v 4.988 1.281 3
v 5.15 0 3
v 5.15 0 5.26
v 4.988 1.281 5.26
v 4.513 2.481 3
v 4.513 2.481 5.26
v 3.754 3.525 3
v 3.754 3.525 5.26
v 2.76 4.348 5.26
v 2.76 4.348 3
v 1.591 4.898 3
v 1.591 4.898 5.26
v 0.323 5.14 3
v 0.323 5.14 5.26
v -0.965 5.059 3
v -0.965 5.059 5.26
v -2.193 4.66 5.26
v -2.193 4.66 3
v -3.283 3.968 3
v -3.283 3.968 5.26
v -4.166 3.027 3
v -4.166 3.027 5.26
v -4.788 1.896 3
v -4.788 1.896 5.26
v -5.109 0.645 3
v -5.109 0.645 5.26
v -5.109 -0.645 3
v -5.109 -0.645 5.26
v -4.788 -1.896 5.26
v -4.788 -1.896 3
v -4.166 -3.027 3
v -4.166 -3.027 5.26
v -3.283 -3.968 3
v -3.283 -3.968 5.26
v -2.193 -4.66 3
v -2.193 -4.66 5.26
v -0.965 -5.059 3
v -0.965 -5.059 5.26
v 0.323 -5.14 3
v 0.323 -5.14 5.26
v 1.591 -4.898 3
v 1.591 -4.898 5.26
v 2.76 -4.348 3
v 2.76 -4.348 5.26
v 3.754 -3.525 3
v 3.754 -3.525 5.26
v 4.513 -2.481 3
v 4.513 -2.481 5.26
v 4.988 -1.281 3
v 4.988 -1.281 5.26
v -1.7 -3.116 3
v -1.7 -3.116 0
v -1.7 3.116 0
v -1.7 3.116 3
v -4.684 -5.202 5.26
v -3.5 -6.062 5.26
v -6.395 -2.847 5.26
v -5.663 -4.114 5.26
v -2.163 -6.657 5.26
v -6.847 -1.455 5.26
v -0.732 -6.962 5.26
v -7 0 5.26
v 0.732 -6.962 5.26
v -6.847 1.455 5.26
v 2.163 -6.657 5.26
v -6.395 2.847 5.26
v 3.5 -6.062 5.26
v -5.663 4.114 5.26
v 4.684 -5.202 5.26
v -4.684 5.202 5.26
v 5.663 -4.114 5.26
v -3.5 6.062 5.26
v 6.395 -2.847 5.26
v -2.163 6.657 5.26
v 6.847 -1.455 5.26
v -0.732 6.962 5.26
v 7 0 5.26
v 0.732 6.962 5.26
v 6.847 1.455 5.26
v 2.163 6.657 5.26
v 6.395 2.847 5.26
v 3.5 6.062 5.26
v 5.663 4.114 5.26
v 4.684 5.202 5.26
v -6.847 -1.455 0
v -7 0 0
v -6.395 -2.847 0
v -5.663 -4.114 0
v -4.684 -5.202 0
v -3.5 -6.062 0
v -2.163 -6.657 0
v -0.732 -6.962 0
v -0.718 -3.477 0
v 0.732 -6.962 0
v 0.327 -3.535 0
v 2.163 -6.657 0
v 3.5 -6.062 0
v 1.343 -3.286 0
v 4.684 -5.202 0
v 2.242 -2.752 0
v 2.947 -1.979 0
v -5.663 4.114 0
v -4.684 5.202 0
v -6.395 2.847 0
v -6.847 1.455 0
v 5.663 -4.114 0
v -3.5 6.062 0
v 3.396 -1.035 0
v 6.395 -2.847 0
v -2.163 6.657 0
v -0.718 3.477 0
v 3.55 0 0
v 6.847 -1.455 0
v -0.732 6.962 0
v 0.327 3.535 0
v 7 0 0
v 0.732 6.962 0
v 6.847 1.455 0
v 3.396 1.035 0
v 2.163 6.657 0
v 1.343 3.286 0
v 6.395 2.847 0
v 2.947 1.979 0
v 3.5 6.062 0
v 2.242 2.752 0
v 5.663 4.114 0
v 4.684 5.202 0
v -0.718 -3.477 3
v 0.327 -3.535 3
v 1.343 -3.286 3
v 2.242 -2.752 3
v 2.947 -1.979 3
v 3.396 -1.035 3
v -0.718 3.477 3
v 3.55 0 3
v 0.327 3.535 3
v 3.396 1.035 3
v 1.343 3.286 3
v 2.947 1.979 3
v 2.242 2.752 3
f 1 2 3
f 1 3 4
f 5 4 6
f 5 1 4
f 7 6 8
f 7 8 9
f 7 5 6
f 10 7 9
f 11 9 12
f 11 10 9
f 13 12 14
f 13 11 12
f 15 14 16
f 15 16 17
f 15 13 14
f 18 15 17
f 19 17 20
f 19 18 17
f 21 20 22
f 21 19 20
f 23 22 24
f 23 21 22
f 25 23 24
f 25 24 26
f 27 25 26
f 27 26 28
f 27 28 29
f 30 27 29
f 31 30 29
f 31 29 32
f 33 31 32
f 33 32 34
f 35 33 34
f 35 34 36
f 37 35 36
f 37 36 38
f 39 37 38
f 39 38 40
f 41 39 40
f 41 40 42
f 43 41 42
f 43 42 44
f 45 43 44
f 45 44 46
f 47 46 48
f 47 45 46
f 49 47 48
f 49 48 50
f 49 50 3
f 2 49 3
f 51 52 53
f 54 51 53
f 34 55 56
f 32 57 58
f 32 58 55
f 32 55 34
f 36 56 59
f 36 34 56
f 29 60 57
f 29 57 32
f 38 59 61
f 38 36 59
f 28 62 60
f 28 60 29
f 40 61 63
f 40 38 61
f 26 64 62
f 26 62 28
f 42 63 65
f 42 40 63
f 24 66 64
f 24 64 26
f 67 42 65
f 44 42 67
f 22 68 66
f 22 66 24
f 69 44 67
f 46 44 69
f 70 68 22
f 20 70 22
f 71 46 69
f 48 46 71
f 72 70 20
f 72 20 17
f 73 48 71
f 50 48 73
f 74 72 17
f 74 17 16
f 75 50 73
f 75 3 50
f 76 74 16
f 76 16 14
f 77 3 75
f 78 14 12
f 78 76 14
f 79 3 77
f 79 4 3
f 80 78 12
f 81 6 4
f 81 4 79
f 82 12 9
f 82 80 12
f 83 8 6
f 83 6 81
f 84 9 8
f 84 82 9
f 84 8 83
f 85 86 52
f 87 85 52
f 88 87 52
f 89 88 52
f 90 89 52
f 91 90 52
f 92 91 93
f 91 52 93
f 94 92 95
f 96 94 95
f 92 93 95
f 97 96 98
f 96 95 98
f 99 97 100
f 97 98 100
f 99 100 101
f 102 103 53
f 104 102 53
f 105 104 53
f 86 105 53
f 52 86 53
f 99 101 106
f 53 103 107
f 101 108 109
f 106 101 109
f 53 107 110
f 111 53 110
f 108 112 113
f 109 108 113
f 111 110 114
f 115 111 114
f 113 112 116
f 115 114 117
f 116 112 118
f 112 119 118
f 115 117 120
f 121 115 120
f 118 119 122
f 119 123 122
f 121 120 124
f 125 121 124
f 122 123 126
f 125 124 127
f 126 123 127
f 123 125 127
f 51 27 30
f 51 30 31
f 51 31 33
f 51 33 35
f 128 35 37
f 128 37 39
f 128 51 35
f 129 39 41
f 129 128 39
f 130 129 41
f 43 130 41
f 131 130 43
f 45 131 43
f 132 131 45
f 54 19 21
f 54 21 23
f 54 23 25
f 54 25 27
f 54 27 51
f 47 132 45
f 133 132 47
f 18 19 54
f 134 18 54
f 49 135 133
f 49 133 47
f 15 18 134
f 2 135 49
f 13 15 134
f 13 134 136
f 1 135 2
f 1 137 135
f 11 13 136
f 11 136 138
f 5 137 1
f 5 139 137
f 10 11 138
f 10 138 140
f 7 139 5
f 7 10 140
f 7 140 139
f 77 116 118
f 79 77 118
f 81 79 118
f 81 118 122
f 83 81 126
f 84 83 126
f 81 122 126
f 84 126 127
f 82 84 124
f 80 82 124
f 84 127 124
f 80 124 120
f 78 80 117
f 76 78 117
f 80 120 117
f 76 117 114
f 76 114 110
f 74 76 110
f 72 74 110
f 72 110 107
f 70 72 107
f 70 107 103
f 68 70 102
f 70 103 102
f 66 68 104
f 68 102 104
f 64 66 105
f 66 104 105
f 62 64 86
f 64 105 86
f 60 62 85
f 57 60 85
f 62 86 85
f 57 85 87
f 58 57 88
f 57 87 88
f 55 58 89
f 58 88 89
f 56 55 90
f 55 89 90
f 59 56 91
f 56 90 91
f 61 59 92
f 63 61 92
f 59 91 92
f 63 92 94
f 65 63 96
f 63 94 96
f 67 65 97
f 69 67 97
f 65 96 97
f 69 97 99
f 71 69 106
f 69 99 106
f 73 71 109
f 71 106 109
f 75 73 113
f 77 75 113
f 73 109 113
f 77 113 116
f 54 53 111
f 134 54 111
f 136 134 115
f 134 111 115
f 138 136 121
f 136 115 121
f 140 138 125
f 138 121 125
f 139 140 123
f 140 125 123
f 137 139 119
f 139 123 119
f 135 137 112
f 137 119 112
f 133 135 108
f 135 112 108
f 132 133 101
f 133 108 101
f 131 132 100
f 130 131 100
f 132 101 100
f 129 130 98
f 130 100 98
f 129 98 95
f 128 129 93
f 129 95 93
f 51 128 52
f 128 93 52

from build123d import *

# Parameters (mm, degrees)
F0_R     = 5.15
F1_DEPTH = 3
F0_R_2   = 7
F2_DEPTH = 5.26


with BuildPart() as f1:
    # F0 (on Top) → F1 (new body)
    with BuildSketch(Plane.XY):
        Circle(F0_R)
        with BuildLine():
            ThreePointArc((-1.7, 3.116488), (3.55, 0), (-1.7, -3.116488))
            Line((-1.7, -3.116488), (-1.7, 3.116488))
        make_face(mode=Mode.SUBTRACT)
    extrude(amount=F1_DEPTH)

    # F0 (on Top) → F2 (join)
    with BuildSketch(Plane.XY):
        Circle(F0_R_2)
        Circle(F0_R, mode=Mode.SUBTRACT)
    extrude(amount=F2_DEPTH)


solid = f1.part
